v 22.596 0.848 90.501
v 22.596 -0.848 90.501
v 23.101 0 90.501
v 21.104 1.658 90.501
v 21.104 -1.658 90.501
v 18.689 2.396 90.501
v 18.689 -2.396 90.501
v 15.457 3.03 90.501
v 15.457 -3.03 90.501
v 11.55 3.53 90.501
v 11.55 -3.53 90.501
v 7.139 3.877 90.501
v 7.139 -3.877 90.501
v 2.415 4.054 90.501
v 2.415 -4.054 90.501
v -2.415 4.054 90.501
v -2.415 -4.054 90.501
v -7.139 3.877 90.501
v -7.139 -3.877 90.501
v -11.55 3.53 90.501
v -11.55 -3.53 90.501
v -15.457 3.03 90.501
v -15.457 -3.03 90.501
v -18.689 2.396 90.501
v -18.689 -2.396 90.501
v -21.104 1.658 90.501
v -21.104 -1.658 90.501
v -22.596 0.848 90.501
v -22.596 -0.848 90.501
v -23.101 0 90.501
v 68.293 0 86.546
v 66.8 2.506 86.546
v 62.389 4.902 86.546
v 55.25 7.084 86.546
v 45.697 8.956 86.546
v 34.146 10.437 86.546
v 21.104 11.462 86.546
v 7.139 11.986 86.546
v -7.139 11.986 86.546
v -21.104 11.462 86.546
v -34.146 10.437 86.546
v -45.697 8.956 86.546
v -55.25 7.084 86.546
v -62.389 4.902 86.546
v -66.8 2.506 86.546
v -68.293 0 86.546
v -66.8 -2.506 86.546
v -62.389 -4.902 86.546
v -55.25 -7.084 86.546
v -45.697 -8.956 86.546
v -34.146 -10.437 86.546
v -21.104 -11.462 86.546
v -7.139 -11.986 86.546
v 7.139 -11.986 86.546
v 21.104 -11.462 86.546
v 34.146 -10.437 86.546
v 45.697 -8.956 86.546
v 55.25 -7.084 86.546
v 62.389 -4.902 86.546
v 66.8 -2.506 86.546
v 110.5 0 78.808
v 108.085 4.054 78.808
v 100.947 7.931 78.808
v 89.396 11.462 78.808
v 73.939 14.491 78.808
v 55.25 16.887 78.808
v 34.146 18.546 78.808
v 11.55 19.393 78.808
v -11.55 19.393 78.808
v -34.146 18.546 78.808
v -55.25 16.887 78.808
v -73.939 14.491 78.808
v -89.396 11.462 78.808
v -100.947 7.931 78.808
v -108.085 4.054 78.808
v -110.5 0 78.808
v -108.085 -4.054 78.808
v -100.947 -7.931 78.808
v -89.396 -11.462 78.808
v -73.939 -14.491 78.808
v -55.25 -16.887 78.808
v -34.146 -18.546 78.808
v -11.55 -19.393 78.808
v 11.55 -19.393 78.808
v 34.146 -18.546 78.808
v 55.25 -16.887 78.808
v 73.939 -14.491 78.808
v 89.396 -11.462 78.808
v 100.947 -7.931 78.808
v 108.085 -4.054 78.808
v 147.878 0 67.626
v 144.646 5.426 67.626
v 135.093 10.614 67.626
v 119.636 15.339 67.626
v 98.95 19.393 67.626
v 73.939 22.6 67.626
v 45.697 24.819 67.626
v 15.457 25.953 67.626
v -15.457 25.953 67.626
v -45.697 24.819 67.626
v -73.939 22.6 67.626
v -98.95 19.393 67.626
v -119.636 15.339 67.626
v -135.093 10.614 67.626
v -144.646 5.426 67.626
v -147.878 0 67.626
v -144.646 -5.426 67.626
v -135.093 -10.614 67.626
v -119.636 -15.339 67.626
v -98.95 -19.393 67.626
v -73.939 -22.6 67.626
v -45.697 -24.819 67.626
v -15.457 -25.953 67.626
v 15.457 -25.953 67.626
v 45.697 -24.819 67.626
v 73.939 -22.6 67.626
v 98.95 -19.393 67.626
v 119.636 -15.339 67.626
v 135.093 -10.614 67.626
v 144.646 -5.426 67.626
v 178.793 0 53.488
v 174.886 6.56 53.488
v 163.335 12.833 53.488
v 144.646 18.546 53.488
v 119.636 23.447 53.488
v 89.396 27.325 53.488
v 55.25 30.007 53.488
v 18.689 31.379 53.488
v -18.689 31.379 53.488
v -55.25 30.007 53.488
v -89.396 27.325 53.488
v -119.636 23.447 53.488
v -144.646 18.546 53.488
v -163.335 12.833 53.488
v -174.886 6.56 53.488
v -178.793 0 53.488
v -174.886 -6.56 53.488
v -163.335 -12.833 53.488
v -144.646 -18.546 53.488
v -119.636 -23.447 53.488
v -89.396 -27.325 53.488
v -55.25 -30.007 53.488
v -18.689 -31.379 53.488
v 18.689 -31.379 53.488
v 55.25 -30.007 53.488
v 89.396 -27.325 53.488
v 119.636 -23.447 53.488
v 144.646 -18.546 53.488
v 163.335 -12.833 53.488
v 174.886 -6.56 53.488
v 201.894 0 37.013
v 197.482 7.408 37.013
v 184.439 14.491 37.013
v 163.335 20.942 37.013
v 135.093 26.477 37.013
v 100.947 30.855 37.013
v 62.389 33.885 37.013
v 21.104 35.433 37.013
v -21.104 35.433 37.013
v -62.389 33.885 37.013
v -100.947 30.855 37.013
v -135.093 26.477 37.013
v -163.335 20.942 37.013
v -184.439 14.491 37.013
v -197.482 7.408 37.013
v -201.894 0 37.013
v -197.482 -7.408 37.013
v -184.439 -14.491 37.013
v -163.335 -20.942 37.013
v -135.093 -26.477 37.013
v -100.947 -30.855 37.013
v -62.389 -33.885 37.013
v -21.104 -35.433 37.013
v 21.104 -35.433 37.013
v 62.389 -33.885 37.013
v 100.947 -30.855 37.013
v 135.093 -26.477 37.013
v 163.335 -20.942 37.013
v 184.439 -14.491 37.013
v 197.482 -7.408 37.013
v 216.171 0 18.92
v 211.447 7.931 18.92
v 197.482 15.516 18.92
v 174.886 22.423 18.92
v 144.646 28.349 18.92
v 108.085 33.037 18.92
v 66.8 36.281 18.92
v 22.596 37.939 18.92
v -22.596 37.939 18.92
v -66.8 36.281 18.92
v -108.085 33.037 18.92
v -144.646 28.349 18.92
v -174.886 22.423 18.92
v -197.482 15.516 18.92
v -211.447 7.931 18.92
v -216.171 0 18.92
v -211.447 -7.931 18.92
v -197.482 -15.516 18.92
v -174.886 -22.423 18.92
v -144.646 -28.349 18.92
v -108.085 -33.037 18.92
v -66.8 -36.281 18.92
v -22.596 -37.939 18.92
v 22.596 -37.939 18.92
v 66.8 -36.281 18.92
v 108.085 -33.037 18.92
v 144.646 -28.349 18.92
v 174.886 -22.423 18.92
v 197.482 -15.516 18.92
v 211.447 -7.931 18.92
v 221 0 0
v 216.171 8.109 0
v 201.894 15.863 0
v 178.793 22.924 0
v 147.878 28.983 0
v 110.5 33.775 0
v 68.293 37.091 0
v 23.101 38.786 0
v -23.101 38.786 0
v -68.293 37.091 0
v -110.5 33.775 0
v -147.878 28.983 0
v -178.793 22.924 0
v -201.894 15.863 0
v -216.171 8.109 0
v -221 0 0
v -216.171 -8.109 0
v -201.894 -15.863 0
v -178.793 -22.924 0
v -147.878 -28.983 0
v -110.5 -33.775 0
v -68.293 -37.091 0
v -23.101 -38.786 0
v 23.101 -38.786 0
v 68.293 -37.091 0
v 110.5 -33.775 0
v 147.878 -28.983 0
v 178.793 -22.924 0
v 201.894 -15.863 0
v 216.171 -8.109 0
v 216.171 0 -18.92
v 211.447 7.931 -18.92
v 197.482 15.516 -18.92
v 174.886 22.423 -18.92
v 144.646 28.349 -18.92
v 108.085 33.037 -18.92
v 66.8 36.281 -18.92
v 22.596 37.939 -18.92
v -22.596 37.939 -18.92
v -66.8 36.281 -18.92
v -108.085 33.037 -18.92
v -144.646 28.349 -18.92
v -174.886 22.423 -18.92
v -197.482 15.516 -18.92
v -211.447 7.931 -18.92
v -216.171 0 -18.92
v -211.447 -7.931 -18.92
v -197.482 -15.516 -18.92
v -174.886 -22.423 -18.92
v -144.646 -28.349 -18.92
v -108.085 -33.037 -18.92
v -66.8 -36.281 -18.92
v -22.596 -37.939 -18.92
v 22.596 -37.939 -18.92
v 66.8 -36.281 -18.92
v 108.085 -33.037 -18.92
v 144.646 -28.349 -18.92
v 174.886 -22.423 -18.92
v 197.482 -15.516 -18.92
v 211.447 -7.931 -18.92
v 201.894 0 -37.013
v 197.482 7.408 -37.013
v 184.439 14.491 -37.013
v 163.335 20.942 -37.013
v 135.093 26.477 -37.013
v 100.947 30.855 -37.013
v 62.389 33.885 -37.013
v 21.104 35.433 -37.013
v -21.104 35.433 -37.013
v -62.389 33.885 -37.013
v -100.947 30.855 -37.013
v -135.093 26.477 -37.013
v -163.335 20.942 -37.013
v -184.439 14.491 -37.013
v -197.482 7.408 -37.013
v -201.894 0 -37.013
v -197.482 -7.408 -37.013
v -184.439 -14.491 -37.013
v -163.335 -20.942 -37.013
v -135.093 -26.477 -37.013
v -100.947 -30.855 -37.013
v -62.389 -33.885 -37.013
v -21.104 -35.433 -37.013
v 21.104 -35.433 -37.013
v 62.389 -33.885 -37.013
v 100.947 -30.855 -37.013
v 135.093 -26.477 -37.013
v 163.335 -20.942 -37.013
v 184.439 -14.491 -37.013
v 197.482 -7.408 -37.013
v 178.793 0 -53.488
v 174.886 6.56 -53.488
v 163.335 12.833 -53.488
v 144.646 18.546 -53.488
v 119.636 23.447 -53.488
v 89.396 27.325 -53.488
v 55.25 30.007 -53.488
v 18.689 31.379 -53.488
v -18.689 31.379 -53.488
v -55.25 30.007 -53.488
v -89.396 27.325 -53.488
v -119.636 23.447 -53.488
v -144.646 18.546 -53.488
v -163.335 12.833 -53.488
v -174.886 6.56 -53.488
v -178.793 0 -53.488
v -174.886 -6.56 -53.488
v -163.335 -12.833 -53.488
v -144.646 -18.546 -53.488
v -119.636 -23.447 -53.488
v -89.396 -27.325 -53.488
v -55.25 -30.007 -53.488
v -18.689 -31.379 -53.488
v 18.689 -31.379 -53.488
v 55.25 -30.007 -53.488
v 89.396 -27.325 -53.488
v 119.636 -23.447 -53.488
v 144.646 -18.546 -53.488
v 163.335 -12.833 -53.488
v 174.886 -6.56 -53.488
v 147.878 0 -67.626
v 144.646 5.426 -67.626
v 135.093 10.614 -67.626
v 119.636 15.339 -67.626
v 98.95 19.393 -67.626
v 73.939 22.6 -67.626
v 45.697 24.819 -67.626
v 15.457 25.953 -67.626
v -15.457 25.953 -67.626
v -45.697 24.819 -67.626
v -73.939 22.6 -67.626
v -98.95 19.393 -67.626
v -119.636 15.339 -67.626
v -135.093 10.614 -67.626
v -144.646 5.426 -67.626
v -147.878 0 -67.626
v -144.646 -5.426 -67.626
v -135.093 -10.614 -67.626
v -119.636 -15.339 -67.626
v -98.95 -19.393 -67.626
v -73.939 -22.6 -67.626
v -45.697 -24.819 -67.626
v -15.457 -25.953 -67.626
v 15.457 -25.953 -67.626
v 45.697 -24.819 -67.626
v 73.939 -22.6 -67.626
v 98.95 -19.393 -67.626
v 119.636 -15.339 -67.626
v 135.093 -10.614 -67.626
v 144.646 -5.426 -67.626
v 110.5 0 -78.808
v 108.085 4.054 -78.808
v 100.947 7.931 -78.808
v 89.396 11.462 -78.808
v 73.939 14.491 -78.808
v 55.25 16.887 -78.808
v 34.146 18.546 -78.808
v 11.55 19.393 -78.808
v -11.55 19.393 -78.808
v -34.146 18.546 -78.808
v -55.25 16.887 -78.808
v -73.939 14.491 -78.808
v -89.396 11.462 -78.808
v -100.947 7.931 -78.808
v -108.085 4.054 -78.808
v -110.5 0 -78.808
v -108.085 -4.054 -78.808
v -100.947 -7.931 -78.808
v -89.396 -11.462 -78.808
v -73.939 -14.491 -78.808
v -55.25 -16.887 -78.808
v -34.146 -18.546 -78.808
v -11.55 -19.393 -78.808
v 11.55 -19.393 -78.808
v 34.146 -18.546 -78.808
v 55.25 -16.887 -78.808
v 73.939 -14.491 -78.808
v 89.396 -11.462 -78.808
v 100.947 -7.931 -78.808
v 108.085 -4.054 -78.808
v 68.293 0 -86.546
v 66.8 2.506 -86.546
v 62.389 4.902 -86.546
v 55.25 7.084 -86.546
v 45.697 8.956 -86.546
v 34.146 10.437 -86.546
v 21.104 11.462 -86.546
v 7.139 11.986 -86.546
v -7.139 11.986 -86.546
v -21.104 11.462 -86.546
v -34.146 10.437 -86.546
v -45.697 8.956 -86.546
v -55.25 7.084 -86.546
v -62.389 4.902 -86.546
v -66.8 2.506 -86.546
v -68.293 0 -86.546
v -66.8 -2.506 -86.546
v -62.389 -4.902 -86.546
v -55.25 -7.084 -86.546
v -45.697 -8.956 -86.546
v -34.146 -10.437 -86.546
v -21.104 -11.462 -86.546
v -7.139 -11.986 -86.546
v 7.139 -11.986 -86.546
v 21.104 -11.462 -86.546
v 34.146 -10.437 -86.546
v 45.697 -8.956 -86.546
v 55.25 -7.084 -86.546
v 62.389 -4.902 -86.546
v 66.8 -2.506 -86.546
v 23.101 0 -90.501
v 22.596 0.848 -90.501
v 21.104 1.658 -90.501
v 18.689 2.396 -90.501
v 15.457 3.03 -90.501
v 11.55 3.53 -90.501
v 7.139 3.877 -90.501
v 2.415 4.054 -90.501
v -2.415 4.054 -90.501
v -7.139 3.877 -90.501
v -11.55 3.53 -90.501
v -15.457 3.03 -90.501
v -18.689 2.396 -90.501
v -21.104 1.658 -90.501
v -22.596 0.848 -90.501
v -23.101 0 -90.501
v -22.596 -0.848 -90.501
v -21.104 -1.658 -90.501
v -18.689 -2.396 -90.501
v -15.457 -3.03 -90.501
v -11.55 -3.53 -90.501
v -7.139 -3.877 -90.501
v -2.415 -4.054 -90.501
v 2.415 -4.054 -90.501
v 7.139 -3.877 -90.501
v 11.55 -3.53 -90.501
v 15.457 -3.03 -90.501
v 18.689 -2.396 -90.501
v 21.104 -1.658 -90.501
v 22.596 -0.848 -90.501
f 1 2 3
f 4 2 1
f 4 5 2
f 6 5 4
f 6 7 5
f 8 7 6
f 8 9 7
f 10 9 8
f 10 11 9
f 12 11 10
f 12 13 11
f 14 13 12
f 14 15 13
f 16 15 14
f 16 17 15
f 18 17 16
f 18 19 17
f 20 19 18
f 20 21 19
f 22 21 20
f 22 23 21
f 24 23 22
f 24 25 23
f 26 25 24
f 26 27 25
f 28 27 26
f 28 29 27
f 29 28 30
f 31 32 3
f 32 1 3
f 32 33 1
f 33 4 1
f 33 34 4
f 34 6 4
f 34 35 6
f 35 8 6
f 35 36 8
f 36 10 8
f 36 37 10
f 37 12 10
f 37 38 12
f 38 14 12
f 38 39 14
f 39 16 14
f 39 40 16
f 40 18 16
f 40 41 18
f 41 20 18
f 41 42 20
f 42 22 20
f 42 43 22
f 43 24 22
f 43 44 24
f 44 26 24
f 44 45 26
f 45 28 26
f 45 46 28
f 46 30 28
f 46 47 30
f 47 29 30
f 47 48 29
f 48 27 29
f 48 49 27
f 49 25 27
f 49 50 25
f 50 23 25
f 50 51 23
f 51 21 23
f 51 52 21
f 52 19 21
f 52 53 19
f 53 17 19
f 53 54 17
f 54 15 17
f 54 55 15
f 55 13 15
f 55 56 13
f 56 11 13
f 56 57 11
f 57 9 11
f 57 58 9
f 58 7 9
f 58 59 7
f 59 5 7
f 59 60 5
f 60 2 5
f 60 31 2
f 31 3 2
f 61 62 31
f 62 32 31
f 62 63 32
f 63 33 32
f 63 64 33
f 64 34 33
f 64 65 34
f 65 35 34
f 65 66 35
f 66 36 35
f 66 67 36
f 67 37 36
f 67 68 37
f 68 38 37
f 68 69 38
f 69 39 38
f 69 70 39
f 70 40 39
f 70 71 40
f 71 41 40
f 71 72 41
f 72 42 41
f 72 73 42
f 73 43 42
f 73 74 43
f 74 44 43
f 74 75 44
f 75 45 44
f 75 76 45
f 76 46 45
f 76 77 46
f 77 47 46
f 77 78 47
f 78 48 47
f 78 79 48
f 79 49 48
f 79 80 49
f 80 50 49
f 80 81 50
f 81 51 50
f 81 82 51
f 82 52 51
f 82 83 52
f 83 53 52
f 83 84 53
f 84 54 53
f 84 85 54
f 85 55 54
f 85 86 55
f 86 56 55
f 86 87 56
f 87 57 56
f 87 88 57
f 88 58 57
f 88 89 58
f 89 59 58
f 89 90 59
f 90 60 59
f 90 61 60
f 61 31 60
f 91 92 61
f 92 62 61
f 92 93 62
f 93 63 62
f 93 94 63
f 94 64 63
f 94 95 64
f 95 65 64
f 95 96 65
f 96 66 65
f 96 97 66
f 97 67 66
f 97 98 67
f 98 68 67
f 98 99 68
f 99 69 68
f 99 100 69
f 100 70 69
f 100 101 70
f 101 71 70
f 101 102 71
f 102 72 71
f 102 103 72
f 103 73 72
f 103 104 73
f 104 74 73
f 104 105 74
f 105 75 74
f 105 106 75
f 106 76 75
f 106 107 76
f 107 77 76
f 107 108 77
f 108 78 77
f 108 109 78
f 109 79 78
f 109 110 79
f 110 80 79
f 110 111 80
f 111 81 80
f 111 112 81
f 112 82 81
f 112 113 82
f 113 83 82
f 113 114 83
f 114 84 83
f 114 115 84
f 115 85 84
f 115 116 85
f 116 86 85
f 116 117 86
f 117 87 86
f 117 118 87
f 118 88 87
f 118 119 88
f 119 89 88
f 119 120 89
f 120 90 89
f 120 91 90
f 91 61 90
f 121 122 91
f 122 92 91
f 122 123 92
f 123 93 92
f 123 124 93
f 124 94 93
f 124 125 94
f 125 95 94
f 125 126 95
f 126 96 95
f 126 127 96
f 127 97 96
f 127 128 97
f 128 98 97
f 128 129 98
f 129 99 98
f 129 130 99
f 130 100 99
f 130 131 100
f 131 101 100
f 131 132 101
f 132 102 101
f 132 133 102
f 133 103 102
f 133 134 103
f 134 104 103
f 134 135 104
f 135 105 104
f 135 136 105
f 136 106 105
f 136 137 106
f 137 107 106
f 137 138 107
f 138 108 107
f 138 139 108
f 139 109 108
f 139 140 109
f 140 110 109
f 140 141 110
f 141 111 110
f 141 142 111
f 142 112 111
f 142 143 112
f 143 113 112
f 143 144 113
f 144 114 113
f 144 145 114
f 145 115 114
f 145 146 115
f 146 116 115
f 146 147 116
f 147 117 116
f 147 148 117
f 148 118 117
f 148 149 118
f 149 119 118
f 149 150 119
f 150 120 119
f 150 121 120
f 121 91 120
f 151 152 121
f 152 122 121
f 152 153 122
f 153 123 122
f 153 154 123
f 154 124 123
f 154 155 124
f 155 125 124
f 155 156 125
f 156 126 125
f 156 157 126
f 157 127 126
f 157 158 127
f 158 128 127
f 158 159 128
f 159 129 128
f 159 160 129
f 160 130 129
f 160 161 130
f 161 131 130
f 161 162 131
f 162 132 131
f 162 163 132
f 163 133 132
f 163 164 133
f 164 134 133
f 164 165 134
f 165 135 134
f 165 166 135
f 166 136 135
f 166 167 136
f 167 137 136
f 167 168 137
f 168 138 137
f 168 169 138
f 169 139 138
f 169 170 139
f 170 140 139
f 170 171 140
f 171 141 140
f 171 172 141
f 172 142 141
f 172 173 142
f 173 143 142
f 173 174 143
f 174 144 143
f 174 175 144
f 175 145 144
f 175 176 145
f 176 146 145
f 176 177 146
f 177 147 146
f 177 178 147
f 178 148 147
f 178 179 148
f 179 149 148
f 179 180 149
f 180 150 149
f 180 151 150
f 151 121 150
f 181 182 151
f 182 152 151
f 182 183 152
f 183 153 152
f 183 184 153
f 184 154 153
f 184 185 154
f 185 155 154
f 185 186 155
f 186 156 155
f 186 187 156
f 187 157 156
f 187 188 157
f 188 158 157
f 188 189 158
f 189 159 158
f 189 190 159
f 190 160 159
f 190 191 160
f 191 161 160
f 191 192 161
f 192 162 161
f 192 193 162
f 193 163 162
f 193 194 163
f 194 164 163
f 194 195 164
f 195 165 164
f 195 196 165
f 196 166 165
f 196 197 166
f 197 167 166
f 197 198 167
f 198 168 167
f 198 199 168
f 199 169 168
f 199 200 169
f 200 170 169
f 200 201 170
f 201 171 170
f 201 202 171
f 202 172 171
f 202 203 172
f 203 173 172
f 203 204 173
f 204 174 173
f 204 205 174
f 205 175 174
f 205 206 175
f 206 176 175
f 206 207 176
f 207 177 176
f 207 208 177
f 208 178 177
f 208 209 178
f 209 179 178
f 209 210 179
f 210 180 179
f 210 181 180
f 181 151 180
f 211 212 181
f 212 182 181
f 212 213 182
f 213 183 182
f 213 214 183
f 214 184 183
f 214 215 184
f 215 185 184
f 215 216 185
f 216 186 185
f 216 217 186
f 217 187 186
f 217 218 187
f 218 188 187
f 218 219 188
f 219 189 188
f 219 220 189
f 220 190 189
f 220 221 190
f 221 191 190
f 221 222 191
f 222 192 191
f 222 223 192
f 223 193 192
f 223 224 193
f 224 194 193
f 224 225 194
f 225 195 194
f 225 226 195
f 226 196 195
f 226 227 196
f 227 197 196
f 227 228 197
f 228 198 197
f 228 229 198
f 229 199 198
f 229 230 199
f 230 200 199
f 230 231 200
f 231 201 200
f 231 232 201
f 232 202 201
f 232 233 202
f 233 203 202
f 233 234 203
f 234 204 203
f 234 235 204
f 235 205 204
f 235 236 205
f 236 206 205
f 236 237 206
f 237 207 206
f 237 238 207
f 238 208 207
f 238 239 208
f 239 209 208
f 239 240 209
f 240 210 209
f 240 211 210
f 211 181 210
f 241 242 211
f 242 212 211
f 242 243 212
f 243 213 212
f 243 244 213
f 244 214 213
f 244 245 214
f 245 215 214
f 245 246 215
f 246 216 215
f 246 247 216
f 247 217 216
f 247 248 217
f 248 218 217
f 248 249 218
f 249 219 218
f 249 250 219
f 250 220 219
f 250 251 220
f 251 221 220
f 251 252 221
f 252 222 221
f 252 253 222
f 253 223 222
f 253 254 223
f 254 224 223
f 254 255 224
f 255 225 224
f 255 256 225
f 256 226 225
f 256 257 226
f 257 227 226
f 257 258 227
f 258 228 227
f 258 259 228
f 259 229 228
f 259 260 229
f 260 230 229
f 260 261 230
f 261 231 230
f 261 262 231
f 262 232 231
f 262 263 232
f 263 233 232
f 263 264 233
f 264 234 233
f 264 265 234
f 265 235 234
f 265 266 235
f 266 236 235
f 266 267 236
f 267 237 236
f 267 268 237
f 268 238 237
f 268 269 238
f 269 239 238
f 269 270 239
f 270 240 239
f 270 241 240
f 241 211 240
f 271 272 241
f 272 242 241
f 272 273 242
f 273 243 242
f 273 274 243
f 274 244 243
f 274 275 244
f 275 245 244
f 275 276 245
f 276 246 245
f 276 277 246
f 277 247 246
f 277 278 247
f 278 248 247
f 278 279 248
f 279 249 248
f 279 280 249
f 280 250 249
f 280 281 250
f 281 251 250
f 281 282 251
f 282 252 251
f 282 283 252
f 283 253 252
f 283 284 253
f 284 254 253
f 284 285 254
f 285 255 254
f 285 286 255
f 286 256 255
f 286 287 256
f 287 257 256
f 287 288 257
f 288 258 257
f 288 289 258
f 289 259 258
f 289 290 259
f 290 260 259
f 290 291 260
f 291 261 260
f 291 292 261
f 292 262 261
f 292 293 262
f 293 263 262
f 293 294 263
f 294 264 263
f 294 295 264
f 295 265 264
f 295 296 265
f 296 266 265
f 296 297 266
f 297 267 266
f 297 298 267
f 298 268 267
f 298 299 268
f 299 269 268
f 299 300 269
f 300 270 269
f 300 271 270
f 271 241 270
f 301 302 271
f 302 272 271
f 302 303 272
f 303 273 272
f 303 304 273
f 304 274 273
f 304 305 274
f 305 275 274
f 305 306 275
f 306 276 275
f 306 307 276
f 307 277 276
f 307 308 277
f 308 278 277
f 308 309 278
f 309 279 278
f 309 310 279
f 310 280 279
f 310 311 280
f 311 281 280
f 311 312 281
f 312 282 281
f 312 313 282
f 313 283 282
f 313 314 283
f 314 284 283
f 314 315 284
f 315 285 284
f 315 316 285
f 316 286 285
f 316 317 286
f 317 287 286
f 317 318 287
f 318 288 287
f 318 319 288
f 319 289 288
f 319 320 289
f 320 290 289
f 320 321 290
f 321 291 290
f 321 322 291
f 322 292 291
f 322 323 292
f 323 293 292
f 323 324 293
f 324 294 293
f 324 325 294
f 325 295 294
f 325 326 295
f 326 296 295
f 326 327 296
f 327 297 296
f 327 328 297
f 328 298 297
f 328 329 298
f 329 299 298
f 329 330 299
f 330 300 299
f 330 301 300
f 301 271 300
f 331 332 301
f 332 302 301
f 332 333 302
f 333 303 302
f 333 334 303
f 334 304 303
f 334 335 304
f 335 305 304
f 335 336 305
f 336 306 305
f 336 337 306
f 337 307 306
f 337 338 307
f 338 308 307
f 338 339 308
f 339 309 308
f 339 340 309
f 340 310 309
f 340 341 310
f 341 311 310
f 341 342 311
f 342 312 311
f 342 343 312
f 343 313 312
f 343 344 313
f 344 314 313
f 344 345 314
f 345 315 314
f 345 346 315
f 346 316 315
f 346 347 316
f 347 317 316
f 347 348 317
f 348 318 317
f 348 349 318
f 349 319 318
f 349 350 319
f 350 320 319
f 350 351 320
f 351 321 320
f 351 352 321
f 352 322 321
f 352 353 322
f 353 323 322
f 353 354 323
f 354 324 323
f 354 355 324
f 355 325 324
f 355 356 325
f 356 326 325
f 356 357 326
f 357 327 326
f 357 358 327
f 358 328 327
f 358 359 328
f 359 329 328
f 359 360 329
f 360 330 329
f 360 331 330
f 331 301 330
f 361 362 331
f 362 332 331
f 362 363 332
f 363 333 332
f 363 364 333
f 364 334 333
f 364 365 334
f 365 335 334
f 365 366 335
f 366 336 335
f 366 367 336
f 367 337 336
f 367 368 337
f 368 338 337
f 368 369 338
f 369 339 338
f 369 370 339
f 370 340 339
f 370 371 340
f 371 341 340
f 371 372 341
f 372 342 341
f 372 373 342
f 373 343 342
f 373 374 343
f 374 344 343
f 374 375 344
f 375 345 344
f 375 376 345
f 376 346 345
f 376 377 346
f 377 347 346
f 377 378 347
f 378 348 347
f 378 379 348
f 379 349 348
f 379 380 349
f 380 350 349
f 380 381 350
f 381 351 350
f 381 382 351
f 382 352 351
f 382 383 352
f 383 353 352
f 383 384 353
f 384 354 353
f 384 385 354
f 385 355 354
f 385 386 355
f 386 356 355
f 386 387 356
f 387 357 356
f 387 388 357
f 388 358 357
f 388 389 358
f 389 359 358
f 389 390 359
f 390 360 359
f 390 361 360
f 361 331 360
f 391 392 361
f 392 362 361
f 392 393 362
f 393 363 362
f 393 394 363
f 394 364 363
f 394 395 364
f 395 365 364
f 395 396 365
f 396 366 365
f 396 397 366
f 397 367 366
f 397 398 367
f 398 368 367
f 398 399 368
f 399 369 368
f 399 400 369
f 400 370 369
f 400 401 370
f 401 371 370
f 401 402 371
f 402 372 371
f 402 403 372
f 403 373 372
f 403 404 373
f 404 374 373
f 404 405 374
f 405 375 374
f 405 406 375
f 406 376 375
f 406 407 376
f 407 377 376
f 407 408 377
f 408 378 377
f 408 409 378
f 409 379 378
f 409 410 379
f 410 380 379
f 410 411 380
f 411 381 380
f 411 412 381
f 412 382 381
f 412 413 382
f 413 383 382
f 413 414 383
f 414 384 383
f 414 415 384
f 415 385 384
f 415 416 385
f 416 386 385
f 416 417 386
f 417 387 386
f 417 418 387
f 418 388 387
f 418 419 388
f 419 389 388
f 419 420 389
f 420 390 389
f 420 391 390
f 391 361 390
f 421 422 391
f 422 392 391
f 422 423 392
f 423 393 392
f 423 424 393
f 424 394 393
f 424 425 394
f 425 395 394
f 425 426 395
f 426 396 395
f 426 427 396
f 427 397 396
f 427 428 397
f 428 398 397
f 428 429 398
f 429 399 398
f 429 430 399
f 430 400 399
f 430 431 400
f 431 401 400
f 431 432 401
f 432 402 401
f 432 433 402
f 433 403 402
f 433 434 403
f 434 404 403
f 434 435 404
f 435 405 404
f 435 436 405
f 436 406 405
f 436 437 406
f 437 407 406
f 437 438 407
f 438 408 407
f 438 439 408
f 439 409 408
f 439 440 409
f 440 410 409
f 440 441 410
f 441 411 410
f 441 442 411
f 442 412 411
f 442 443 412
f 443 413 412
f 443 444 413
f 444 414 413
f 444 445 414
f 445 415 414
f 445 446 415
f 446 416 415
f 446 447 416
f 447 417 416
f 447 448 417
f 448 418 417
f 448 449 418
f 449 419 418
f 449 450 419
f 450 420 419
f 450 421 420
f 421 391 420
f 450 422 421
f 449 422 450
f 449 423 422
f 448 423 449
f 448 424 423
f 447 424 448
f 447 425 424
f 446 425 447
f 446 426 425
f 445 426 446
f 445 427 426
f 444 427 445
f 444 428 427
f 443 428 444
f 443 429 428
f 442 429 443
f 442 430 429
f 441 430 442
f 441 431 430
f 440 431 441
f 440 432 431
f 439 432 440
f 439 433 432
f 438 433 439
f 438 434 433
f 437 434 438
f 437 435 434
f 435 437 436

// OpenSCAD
// Generated by SolidPython 1.0.1 on 2020-07-29 00:46:52


scale(v = [17, 3, 7]) {
	sphere(r = 13);
}
/***********************************************
*********      SolidPython code:      **********
************************************************
 
# import packages: SolidPython
from solid import *
from solid.utils import *
from itertools import chain, combinations, permutations


class Resize:

    def __init__(self, scad_file):
        self.scad_file = scad_file
        #self.scad_file = import_scad(scad_file)
        # cone/cylinder param:
        self.r1 = 0
        self.r2 = 0
        self.h = 0
        # rectangular prism param:
        self.w = 0
        self.l = 0
        # ellipse param:
        self.r = 0

    # import OpenScad code (file name corresponds to shape)


    # classify shape + parameters
    def assign(self, param1, param2, param3):
        if self.scad_file == 'cone.scad':
            self.r1 = param1
            self.r2 = param2
            self.h = param3
        elif self.scad_file == 'cylinder.scad':
            self.r1 = param1
            self.r2 = param2
            self.h = param3
        elif self.scad_file == 'rectangularPrism.scad':
            self.h = param1
            self.l = param2
            self.w = param3
        else:
            self.r = param1
            self.h = param2

    # resize parameters
    def iterate(self):
        x = range(3, 20, 2)
        i = 1
        if self.scad_file == 'cone.scad':
            tempList = list(permutations(x, 2))
            for temp in tempList:
                param1 = temp[0]
                param2 = temp[1]
                filepath = 'produced_scad_files/' + 'cone' + str(param1) + '_' + str(param2) + '_' + '.scad'
                scad_render_to_file(cylinder(h=param1, r1=param2, r2=0), filepath)

        elif self.scad_file == 'cylinder.scad':
            tempList = list(permutations(x, 3))
            for temp in tempList:
                param1 = temp[0]
                param2 = temp[1]
                filepath = 'produced_scad_files/' + 'cylinder' + str(param1) + '_' + str(param2) + '_' + '.scad'
                scad_render_to_file(cylinder(h=param1, r1=param2, r2=param2), filepath)

        elif self.scad_file == 'rectangularPrism.scad':
            tempList = list(permutations(x, 3))
            for temp in tempList:
                param1 = temp[0]
                param2 = temp[1]
                param3 = temp[2]
                filepath = 'produced_scad_files/' + 'rectangularPrism' + str(param1) + '_' + str(param2) + '_' + str(
                    param3) + '.scad'
                scad_render_to_file(cube(size=(param1, param2, param3)), filepath)

        elif self.scad_file == 'ellipse.scad':
            tempList = list(permutations(x, 4))
            for temp in tempList:
                param1 = temp[0]
                param2 = temp[1]
                param3 = temp[2]
                param4 = temp[3]
                filepath = 'produced_scad_files/' + 'ellipse' + str(param1) + '_' + str(param2) + '_' + str(param3) + '_' + str(param4) + '.scad'
                scad_render_to_file(scale([param1, param2, param3])(sphere(r=param4)), filepath)

    def render_to_scadfile(self):
        scad_render_to_file(scad, 'example.scad') 
 
************************************************/
